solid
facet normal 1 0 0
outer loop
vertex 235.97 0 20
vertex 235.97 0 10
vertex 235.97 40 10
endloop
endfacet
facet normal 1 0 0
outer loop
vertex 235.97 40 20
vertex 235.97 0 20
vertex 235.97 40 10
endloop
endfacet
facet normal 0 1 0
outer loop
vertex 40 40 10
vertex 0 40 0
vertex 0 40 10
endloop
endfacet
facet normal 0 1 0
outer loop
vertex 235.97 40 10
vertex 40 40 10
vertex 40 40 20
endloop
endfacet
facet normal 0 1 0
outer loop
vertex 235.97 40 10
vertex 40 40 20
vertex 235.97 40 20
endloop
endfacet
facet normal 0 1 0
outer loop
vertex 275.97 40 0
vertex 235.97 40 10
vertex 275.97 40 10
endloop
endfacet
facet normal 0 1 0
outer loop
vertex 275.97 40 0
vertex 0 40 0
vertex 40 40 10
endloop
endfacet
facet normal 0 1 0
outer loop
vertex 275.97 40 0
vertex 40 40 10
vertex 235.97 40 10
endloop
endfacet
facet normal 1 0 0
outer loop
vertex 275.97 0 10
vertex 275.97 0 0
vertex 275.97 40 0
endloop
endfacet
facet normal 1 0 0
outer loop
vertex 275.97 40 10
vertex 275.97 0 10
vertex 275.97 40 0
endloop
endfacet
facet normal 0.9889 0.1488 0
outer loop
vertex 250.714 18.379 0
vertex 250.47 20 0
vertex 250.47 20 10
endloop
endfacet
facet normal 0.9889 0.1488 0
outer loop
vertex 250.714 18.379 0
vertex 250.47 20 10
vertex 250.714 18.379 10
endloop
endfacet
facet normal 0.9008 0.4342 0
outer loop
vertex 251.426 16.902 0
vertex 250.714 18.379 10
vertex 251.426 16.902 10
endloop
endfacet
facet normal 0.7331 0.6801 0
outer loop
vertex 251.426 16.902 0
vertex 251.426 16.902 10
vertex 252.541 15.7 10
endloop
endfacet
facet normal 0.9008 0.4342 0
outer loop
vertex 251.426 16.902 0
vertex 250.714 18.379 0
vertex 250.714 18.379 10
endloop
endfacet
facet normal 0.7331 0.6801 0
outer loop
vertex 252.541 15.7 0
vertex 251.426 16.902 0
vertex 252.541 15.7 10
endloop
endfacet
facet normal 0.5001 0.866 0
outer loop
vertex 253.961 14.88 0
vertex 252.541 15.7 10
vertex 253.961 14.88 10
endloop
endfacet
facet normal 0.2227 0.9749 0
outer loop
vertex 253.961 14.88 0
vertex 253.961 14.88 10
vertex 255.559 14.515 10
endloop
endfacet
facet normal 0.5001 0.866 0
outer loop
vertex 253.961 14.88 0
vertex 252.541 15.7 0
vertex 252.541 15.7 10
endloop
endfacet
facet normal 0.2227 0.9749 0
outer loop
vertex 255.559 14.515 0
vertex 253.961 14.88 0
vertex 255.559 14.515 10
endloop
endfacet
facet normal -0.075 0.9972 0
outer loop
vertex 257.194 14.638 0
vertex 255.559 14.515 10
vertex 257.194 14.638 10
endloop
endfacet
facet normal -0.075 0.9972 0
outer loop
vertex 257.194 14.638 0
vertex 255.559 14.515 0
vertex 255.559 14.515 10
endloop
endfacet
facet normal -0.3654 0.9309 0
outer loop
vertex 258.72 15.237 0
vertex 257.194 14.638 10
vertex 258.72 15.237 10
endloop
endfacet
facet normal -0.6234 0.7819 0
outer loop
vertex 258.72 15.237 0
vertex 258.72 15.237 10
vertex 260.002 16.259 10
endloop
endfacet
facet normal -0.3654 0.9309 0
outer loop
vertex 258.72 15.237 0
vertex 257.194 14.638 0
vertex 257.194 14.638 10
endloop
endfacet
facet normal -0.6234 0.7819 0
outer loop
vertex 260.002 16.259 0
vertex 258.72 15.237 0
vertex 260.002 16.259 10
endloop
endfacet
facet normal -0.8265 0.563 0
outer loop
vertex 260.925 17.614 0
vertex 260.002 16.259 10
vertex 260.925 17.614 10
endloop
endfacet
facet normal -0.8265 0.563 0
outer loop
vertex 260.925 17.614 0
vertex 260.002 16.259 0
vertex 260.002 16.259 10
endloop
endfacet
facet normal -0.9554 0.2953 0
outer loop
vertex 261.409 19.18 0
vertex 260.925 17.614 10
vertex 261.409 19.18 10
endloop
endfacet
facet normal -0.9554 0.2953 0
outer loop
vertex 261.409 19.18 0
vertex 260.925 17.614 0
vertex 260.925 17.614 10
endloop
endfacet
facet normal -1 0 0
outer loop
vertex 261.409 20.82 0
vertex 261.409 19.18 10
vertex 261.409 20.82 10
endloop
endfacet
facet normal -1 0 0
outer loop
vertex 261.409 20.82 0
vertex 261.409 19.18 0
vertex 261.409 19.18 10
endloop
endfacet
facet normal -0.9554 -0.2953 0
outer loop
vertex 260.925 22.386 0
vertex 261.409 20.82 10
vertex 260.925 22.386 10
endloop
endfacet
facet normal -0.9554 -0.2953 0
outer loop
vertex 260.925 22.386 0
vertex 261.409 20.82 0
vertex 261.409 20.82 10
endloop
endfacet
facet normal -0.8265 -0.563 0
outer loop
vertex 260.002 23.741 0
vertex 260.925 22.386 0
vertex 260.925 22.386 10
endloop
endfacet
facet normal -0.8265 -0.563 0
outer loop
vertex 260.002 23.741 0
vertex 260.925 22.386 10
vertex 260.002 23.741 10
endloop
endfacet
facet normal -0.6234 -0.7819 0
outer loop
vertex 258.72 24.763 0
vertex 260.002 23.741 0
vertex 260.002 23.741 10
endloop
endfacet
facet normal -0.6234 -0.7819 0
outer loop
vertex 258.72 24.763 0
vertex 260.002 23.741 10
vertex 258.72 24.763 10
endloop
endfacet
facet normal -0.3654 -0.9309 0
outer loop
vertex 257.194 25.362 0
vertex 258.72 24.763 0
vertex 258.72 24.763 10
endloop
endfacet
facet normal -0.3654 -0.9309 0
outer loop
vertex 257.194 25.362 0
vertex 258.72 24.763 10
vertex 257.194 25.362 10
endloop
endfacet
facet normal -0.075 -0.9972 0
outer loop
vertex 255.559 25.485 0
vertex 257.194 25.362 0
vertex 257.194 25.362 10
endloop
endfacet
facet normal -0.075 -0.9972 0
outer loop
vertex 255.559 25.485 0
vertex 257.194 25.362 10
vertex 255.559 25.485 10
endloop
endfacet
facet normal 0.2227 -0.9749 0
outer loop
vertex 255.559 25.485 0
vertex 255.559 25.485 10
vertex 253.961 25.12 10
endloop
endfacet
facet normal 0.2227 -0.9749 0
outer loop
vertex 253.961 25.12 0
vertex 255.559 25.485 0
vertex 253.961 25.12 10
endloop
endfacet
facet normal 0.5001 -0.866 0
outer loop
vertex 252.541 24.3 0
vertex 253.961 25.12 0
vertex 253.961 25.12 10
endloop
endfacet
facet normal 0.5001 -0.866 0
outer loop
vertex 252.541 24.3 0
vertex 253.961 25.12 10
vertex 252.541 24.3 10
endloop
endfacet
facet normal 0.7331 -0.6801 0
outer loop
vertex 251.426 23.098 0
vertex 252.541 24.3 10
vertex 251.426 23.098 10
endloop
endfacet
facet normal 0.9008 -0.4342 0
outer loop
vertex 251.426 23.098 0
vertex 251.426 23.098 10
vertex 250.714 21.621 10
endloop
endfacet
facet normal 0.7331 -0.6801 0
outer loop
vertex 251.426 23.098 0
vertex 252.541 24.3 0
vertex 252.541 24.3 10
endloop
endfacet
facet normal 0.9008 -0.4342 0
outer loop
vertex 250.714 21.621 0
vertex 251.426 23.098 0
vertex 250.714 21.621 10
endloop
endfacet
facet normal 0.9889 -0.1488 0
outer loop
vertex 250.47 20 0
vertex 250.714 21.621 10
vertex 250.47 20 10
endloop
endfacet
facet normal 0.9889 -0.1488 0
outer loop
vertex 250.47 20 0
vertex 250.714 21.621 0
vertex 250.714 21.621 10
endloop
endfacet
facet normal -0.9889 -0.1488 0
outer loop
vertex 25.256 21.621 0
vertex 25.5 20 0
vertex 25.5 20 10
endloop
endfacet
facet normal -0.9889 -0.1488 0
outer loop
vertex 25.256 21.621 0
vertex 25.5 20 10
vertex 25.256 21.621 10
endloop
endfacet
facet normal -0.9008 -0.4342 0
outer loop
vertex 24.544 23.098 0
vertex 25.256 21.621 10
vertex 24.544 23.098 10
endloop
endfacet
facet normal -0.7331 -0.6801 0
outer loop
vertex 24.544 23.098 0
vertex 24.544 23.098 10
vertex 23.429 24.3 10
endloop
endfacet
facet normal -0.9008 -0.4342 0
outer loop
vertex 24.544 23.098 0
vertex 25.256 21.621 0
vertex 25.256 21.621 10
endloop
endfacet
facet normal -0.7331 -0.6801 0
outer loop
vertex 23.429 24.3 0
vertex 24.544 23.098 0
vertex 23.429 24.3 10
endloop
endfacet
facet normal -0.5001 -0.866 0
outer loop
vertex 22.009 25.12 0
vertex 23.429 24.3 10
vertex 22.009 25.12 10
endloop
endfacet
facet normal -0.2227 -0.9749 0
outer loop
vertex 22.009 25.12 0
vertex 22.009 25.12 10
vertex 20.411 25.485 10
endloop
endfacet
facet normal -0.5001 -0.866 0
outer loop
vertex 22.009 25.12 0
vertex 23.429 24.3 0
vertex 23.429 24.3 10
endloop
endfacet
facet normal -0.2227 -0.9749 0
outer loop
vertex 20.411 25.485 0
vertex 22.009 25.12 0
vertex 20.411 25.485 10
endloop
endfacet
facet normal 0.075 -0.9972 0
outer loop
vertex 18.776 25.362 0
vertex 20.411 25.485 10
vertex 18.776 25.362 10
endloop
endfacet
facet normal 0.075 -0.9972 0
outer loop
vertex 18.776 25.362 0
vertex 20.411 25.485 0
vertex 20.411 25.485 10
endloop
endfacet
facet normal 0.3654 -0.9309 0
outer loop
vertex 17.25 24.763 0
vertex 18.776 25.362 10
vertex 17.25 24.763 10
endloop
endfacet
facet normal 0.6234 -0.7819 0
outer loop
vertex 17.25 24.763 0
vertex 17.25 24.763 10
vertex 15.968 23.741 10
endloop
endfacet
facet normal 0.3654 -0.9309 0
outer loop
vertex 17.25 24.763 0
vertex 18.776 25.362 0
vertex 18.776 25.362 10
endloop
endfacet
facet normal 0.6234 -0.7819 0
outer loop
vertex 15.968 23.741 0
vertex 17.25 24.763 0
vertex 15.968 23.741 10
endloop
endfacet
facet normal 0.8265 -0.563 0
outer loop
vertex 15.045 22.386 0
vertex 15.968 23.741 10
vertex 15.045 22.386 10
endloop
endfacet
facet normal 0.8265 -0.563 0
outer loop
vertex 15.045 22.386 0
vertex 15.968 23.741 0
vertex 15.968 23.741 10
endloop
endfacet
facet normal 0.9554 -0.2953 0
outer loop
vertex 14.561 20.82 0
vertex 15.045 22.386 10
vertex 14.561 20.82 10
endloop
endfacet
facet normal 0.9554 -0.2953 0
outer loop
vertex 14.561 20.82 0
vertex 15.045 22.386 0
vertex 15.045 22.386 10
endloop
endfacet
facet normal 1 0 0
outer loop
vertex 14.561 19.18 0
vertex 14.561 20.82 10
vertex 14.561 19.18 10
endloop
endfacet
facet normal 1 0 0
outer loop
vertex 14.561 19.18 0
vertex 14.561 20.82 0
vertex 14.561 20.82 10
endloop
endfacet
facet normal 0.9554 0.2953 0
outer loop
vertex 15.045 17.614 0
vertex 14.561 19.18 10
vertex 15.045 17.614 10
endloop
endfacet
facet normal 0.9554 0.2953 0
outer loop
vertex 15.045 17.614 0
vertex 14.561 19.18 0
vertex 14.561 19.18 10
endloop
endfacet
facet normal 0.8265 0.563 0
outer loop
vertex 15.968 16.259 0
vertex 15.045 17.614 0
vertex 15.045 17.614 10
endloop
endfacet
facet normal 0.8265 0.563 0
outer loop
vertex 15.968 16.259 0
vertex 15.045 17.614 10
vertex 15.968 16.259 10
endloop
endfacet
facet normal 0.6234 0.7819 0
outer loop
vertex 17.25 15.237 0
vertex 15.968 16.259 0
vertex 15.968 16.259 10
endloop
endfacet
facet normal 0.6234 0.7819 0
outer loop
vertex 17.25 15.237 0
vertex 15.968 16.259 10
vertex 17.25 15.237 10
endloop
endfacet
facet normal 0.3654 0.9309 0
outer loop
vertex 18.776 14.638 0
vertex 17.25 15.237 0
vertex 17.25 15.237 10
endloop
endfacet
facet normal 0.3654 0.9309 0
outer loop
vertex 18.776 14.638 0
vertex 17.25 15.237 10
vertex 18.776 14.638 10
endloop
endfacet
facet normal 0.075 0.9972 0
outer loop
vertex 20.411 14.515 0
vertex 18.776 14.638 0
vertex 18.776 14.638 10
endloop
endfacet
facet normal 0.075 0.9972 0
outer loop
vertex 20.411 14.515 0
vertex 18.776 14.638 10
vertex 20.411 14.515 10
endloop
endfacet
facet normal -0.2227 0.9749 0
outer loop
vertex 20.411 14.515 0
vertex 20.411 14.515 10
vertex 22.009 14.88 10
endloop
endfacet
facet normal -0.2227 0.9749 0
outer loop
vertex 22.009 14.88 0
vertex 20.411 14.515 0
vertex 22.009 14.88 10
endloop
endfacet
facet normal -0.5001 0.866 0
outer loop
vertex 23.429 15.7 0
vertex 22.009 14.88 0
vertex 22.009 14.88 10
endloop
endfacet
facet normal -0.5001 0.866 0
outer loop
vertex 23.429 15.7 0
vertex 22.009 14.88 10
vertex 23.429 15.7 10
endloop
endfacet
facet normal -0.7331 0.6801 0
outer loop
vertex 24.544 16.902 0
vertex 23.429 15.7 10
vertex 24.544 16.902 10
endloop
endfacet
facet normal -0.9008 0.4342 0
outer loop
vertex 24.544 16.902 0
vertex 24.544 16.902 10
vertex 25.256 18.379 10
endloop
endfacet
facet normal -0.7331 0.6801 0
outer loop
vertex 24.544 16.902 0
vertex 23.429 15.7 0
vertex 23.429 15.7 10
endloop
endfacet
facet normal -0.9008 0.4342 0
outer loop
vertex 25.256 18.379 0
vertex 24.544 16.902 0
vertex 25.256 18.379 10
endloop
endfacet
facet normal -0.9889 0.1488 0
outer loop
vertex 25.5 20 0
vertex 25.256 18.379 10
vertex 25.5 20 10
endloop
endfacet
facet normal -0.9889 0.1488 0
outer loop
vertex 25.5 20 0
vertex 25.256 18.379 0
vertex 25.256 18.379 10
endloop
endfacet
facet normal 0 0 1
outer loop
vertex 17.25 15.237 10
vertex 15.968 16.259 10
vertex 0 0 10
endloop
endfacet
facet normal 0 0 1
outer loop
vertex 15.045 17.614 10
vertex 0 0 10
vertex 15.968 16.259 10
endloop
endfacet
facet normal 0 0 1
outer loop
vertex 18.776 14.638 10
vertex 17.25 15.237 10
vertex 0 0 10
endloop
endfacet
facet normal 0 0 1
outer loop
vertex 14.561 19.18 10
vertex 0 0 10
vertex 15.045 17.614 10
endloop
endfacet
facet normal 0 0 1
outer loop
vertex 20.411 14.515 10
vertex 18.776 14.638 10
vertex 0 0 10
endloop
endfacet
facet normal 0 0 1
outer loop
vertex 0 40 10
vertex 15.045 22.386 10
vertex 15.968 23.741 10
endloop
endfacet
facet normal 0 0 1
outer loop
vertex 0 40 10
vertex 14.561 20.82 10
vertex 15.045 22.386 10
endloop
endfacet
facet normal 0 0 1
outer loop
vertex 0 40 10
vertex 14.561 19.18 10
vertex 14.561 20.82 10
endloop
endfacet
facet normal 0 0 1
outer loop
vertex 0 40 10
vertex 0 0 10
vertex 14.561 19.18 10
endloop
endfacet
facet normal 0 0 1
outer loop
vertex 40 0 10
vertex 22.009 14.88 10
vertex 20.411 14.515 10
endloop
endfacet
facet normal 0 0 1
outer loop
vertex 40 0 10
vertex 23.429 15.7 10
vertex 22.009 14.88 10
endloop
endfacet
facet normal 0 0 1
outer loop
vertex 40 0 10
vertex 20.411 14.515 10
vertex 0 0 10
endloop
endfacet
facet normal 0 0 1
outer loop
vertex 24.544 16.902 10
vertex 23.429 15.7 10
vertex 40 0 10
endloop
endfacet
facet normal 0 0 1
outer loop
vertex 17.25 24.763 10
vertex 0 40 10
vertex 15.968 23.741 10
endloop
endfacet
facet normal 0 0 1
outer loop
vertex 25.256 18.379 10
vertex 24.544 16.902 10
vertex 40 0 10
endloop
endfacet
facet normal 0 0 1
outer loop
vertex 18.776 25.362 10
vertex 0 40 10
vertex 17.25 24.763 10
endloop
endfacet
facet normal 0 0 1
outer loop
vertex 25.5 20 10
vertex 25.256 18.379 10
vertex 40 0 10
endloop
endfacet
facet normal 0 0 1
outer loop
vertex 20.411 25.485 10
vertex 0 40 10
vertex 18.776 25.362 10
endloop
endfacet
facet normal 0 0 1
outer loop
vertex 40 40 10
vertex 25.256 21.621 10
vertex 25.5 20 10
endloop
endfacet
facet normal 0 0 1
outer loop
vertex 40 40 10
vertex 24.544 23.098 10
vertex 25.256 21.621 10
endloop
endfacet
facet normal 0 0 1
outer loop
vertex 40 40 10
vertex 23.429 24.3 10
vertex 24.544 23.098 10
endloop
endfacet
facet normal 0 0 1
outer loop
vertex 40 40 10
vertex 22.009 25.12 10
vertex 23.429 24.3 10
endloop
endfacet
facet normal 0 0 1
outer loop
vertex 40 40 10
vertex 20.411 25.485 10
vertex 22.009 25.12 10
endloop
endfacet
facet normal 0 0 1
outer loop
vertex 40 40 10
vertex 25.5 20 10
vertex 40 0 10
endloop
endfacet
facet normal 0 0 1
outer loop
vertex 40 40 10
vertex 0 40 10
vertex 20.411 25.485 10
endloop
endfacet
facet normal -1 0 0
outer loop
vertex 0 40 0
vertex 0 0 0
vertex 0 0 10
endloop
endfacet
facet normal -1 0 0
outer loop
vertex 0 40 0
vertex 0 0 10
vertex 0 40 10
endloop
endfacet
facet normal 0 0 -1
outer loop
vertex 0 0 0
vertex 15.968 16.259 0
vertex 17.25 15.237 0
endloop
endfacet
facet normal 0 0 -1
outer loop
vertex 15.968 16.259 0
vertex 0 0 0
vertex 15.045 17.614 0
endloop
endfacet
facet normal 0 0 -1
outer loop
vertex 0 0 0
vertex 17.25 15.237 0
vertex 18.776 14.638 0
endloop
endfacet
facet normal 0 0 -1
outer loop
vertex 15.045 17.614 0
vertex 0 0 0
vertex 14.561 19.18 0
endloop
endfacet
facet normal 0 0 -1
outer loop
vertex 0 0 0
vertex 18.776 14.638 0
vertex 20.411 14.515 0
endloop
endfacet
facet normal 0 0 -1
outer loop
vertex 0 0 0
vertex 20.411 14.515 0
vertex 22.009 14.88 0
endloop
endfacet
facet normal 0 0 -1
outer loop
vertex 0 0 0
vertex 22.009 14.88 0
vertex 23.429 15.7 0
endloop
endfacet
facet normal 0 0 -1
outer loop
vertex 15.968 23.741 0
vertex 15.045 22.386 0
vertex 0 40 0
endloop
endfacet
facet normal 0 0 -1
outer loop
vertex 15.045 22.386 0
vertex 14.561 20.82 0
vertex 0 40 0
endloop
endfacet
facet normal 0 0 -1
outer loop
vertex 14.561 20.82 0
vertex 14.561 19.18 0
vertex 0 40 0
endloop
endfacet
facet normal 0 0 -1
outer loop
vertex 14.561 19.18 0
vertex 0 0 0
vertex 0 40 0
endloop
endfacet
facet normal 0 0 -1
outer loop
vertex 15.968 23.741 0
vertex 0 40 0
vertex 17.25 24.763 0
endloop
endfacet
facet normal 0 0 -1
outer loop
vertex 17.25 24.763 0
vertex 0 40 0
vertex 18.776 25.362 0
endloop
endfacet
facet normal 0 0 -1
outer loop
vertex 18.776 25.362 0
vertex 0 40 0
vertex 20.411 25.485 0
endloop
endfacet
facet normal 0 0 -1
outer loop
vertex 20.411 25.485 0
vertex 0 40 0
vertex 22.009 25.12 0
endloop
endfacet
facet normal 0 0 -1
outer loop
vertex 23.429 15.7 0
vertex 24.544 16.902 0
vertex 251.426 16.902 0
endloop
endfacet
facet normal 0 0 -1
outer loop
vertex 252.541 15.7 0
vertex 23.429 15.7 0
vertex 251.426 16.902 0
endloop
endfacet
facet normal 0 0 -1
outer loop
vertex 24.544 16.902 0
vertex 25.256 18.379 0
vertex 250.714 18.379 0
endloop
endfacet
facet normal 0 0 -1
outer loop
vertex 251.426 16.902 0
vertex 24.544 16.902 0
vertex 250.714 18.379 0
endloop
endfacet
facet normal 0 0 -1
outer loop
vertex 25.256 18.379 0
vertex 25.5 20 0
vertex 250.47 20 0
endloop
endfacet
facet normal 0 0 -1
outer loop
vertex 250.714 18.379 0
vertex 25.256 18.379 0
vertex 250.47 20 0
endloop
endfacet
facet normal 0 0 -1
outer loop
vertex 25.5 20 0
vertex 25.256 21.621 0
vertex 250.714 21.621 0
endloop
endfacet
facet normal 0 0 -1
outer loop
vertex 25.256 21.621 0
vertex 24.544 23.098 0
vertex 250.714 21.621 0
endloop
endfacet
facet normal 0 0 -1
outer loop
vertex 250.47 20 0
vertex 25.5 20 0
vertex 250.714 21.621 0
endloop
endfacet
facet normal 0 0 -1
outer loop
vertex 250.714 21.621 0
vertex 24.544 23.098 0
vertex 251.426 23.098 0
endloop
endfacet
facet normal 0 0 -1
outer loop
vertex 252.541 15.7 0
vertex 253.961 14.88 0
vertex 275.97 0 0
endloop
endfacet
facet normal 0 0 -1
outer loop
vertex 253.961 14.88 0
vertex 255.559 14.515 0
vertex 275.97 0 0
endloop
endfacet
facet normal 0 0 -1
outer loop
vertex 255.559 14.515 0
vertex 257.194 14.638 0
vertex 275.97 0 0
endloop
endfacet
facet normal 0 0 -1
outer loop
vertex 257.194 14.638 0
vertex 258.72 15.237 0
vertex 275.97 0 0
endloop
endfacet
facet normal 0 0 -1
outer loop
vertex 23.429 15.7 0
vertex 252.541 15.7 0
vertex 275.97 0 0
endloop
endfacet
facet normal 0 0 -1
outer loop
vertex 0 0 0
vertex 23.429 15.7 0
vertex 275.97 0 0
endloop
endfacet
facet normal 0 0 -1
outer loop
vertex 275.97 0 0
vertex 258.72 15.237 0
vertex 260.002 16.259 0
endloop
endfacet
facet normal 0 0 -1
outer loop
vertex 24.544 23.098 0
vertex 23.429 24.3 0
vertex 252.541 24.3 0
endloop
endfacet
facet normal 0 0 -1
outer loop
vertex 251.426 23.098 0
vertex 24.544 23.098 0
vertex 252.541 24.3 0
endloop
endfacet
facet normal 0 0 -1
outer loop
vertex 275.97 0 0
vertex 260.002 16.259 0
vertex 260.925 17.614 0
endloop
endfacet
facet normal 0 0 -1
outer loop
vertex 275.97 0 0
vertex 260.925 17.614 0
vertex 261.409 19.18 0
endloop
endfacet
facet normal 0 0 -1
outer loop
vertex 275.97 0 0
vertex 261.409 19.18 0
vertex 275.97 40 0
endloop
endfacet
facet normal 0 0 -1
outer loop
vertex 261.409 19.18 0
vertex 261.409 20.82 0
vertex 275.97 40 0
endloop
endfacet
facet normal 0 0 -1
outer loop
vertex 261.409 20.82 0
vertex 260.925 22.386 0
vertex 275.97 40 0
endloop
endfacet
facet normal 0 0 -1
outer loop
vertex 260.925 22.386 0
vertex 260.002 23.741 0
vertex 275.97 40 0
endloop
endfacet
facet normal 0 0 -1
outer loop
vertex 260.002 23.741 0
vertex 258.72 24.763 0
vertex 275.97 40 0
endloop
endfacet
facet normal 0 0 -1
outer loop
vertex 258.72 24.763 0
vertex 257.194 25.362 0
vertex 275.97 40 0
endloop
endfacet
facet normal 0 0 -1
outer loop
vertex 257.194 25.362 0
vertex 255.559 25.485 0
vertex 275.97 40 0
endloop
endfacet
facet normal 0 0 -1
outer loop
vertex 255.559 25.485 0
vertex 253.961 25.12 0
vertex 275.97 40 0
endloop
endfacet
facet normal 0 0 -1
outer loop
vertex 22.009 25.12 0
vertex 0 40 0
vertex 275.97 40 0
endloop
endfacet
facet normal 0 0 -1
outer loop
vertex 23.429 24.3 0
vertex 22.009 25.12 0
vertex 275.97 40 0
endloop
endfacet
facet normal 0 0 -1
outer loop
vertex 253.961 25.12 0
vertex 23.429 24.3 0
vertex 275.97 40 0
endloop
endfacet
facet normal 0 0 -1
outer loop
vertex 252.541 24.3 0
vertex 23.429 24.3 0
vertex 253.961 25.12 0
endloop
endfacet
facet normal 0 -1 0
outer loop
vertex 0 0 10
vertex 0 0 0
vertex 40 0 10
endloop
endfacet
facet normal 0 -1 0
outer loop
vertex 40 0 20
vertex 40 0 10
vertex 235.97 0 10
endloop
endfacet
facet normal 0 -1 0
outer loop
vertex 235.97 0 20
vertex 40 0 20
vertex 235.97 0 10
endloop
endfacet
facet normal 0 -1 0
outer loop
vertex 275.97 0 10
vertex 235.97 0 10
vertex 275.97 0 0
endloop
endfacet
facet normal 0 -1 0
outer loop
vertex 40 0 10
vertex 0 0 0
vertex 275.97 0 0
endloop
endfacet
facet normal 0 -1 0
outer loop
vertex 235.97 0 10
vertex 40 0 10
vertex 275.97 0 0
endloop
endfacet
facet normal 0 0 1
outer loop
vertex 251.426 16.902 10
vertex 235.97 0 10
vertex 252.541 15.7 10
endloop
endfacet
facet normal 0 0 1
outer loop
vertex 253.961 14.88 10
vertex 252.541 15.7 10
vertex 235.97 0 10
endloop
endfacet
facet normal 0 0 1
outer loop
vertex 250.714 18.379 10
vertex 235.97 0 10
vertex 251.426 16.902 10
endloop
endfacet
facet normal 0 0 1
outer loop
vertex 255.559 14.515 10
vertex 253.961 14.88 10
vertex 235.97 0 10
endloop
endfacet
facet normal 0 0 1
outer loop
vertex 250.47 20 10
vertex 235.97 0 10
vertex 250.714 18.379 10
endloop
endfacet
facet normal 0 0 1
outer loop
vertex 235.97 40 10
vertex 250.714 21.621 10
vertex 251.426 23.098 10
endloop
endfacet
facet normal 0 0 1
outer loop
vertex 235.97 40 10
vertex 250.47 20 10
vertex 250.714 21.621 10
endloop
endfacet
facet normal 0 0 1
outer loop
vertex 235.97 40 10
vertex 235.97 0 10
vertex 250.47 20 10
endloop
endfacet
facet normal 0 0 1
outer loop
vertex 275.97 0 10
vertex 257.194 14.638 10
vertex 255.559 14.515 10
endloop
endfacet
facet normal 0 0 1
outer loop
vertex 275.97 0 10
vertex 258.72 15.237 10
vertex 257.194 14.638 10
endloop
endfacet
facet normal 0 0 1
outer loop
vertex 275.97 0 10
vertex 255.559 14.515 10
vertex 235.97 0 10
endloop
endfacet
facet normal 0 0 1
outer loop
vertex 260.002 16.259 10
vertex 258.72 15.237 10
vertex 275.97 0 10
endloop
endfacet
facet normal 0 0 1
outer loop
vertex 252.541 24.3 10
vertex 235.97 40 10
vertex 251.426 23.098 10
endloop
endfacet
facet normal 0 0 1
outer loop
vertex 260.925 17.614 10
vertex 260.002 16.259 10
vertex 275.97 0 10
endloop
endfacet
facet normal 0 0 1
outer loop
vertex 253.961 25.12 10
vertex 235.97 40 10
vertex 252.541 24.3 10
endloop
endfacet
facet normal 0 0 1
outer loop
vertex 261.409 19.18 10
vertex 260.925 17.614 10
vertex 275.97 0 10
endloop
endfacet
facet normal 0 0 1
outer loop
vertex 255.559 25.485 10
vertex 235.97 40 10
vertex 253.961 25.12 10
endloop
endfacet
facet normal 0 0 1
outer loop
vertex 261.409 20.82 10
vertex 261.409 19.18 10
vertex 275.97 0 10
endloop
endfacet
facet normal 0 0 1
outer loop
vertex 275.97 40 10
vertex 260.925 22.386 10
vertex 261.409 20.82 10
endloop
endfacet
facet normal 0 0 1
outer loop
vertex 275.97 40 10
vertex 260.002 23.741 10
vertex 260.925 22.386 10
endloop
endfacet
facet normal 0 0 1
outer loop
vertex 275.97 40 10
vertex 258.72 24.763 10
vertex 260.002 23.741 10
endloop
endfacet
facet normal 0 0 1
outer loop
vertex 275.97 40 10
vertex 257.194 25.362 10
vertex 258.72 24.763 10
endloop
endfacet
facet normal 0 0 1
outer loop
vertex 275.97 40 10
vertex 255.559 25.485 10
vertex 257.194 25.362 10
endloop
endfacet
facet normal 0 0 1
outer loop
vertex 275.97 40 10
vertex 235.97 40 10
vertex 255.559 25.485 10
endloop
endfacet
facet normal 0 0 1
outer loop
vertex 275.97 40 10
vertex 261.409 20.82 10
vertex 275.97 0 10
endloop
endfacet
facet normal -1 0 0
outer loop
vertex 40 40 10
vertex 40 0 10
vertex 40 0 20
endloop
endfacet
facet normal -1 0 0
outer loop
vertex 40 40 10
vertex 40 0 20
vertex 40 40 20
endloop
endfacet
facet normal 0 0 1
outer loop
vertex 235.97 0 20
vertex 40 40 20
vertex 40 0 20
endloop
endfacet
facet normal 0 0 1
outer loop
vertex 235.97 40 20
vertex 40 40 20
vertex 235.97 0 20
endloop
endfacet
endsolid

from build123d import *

# Parameters (mm, degrees)
ESQUISSE1_W        = 275.97
ESQUISSE1_H        = 40
ESQUISSE1_R        = 5.5
BOSS_EXTRU_1_DEPTH = 10
ESQUISSE2_W        = 195.97
ESQUISSE2_H        = 40
BOSS_EXTRU_2_DEPTH = 10


with BuildPart() as part:
    # Esquisse1 → Boss.-Extru.1 (new body)
    with BuildSketch(Plane.XY):
        with Locations((137.985, 20)):
            Rectangle(ESQUISSE1_W, ESQUISSE1_H)
        with Locations((20, 20)):
            Circle(ESQUISSE1_R, mode=Mode.SUBTRACT)
        with Locations(Location((255.97, 20, 0), (0, 0, 180))):
            Circle(ESQUISSE1_R, mode=Mode.SUBTRACT)
    extrude(amount=BOSS_EXTRU_1_DEPTH)

    # Esquisse2 → Boss.-Extru.2 (add)
    with BuildSketch(Plane.XY.offset(10)):
        with Locations((137.985, 20)):
            Rectangle(ESQUISSE2_W, ESQUISSE2_H)
    extrude(amount=BOSS_EXTRU_2_DEPTH)


solid = part.part
